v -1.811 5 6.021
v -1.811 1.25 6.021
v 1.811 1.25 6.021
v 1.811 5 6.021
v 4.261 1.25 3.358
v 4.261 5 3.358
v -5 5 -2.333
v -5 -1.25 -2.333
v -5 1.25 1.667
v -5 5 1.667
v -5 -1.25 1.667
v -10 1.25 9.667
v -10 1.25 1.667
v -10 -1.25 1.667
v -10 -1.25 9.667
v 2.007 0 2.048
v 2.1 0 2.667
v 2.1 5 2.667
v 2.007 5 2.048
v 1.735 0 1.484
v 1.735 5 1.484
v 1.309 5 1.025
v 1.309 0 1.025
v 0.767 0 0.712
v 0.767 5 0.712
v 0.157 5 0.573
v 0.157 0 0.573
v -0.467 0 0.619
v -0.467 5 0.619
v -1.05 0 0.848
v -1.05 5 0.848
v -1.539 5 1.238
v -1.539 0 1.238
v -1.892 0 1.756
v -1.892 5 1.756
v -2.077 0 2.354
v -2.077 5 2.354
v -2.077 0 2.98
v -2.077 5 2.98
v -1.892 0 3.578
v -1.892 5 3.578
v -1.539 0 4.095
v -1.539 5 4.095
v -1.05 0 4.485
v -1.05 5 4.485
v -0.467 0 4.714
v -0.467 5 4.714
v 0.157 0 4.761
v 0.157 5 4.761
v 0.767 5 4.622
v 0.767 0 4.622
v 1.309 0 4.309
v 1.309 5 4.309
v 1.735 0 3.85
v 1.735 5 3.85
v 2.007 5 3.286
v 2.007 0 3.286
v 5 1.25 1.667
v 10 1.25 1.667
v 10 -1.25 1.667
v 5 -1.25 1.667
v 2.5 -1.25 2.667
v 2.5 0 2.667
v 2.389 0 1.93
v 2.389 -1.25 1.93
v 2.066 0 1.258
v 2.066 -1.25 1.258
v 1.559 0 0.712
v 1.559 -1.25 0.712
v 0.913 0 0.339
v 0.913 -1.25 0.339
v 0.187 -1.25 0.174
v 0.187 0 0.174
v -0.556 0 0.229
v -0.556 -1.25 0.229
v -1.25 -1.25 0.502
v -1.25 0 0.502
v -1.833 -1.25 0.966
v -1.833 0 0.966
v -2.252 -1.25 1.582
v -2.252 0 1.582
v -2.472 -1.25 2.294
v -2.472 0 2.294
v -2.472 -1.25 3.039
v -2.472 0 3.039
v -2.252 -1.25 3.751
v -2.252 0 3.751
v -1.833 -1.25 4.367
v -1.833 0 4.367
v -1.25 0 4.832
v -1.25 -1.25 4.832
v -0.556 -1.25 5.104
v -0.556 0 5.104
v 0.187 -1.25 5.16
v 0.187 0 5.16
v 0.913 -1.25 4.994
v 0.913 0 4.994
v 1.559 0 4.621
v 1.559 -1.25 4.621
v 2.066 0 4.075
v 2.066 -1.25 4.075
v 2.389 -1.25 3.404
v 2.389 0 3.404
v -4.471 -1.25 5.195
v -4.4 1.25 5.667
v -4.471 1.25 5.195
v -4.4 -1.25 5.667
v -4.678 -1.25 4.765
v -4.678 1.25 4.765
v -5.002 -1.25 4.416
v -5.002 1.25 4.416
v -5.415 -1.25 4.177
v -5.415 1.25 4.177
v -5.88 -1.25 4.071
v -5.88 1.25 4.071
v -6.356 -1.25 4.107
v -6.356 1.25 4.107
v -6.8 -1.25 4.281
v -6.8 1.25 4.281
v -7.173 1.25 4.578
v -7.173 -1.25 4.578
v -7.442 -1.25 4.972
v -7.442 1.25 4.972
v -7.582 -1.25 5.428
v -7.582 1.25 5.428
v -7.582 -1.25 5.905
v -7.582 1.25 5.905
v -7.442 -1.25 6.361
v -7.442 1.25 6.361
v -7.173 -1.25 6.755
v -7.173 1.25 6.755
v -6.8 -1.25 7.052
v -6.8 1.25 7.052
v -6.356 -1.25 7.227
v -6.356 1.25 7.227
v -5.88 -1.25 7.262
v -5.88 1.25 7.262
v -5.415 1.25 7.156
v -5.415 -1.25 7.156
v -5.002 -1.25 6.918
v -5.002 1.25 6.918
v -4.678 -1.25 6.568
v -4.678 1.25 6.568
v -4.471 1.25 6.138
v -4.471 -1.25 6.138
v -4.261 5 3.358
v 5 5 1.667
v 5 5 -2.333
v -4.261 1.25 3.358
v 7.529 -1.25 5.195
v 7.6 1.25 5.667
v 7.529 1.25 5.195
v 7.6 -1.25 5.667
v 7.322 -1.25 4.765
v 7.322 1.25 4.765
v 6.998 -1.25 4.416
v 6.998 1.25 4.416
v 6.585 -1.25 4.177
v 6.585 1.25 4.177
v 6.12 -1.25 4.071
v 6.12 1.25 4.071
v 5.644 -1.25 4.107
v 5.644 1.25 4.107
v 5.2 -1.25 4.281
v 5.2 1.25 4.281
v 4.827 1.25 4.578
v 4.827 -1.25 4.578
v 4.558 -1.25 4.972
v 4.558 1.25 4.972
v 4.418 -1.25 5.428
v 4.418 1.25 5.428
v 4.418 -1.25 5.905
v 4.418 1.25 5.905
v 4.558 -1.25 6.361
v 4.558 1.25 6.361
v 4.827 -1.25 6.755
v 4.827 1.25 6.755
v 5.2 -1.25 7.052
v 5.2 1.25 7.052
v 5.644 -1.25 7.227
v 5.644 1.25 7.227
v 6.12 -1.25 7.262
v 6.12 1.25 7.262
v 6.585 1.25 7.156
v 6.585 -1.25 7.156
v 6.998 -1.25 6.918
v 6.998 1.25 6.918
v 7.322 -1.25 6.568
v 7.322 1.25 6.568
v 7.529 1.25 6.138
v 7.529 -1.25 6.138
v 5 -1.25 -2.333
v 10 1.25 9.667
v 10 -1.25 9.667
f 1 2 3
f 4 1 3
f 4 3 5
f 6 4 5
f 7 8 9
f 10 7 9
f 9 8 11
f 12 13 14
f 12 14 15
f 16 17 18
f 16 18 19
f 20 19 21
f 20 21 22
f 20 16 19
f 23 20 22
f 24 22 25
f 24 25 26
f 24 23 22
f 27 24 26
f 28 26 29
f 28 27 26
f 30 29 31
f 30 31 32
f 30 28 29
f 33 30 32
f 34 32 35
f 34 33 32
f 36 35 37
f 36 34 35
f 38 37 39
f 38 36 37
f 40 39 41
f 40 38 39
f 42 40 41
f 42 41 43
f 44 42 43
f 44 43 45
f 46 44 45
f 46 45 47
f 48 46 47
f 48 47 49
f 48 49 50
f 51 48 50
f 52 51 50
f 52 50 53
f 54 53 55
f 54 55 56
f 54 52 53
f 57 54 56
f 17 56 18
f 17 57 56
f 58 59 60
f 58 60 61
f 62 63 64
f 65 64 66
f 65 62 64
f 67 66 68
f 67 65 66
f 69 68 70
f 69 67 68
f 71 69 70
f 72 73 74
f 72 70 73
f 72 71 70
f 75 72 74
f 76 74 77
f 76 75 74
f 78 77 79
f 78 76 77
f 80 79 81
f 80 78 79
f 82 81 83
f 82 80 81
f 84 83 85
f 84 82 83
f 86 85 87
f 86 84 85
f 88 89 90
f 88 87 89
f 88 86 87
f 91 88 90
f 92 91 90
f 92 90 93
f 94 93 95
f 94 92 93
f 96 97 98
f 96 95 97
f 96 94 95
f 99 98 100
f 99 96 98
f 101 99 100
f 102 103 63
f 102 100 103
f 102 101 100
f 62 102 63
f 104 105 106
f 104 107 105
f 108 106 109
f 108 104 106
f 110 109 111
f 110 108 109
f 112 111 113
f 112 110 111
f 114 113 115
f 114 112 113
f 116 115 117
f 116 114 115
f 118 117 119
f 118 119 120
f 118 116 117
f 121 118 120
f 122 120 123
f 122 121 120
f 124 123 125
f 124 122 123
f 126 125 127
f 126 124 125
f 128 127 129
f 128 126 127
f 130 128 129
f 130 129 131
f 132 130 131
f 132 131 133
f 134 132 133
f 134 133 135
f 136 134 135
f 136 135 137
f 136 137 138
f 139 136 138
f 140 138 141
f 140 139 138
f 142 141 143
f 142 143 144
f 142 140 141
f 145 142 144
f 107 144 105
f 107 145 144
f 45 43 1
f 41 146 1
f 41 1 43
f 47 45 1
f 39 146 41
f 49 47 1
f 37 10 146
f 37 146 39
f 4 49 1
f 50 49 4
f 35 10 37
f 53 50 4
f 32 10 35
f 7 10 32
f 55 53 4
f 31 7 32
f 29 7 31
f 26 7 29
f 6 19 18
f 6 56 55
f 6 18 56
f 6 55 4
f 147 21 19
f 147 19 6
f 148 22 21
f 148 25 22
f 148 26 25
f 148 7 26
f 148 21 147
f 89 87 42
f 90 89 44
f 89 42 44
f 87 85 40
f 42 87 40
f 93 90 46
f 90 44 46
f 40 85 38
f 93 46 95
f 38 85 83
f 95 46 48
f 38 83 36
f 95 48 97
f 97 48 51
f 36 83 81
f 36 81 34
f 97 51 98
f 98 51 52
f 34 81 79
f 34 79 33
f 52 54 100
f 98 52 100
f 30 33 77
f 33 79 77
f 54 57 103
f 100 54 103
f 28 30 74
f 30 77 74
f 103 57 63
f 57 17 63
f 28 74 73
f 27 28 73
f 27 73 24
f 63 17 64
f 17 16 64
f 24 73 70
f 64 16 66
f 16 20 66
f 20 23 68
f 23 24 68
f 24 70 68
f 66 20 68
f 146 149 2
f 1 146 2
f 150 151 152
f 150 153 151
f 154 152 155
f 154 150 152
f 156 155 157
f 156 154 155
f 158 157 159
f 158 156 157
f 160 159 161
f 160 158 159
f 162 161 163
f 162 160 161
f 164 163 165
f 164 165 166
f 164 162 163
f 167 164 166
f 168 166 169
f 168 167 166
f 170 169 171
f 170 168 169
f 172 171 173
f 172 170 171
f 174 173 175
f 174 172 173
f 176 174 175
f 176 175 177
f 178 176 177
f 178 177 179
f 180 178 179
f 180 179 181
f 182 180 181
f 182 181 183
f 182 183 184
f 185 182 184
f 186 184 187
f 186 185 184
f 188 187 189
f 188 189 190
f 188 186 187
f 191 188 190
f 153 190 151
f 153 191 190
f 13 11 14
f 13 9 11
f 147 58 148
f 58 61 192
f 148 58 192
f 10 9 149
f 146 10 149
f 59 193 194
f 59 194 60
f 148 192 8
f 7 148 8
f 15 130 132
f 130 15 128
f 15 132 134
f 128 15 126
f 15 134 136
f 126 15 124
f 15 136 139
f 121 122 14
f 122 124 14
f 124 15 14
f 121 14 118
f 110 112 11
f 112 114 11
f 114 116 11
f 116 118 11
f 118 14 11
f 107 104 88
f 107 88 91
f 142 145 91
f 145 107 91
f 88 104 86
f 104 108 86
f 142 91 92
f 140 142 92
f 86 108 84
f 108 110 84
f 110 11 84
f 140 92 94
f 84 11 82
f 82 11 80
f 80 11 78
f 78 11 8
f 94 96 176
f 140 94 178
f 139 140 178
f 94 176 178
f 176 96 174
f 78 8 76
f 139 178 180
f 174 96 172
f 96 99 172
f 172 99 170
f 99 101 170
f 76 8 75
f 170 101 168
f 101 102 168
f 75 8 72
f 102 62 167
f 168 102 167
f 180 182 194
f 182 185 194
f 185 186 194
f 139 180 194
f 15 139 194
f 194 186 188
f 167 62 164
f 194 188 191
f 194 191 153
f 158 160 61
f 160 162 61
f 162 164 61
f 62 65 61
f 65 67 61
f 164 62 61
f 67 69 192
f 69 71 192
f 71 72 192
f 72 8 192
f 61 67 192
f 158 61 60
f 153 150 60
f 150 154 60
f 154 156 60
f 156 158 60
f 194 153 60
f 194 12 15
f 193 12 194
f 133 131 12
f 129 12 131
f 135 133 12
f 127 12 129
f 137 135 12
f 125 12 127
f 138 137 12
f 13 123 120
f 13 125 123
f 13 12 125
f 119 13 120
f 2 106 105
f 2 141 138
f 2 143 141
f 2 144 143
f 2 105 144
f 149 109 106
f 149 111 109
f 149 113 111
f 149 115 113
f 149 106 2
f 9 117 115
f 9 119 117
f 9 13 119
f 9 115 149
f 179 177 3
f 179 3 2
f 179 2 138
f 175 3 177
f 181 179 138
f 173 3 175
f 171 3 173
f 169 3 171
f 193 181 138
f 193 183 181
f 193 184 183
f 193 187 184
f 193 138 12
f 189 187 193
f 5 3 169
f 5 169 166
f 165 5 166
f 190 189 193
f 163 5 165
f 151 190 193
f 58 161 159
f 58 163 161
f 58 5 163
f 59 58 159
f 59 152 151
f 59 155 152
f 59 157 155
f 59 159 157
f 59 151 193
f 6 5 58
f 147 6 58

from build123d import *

# Parameters (mm, degrees)
SKETCH1_R           = 1.6
SKETCH1_R_2         = 2.5
BOSS_EXTRUDE1_DEPTH = 1.25
SKETCH2_R           = 2.1
BOSS_EXTRUDE2_DEPTH = 5


with BuildPart() as part:
    # Sketch1 → Boss-Extrude1 (new body, symmetric)
    with BuildSketch(Plane(origin=(0, 0, 0), x_dir=(1, 0, 0), z_dir=(0, 1, 0))):
        Polygon((-5, -1.666666667), (-10, -1.666666667), (-10, -9.666666667), (10, -9.666666667), (10, -1.666666667), (5, -1.666666667), (5, 2.333333333), (-5, 2.333333333), align=None)
        with Locations((-6, -5.666666667)):
            Circle(SKETCH1_R, mode=Mode.SUBTRACT)
        with Locations((6, -5.666666667)):
            Circle(SKETCH1_R, mode=Mode.SUBTRACT)
        with Locations((0, -2.666666667)):
            Circle(SKETCH1_R_2, mode=Mode.SUBTRACT)
    extrude(amount=BOSS_EXTRUDE1_DEPTH, both=True)

    # Sketch2 → Boss-Extrude2 (add)
    with BuildSketch(Plane(origin=(0, 0, 0), x_dir=(1, 0, 0), z_dir=(0, 1, 0))):
        Polygon((-5, 2.333333333), (-5, -1.666666667), (-4.260765506, -3.357761167), (-1.81082534, -6.020739609), (1.81082534, -6.020739609), (4.260765506, -3.357761167), (5, -1.666666667), (5, 2.333333333), align=None)
        with Locations((0, -2.666666667)):
            Circle(SKETCH2_R, mode=Mode.SUBTRACT)
    extrude(amount=BOSS_EXTRUDE2_DEPTH)


solid = part.part
